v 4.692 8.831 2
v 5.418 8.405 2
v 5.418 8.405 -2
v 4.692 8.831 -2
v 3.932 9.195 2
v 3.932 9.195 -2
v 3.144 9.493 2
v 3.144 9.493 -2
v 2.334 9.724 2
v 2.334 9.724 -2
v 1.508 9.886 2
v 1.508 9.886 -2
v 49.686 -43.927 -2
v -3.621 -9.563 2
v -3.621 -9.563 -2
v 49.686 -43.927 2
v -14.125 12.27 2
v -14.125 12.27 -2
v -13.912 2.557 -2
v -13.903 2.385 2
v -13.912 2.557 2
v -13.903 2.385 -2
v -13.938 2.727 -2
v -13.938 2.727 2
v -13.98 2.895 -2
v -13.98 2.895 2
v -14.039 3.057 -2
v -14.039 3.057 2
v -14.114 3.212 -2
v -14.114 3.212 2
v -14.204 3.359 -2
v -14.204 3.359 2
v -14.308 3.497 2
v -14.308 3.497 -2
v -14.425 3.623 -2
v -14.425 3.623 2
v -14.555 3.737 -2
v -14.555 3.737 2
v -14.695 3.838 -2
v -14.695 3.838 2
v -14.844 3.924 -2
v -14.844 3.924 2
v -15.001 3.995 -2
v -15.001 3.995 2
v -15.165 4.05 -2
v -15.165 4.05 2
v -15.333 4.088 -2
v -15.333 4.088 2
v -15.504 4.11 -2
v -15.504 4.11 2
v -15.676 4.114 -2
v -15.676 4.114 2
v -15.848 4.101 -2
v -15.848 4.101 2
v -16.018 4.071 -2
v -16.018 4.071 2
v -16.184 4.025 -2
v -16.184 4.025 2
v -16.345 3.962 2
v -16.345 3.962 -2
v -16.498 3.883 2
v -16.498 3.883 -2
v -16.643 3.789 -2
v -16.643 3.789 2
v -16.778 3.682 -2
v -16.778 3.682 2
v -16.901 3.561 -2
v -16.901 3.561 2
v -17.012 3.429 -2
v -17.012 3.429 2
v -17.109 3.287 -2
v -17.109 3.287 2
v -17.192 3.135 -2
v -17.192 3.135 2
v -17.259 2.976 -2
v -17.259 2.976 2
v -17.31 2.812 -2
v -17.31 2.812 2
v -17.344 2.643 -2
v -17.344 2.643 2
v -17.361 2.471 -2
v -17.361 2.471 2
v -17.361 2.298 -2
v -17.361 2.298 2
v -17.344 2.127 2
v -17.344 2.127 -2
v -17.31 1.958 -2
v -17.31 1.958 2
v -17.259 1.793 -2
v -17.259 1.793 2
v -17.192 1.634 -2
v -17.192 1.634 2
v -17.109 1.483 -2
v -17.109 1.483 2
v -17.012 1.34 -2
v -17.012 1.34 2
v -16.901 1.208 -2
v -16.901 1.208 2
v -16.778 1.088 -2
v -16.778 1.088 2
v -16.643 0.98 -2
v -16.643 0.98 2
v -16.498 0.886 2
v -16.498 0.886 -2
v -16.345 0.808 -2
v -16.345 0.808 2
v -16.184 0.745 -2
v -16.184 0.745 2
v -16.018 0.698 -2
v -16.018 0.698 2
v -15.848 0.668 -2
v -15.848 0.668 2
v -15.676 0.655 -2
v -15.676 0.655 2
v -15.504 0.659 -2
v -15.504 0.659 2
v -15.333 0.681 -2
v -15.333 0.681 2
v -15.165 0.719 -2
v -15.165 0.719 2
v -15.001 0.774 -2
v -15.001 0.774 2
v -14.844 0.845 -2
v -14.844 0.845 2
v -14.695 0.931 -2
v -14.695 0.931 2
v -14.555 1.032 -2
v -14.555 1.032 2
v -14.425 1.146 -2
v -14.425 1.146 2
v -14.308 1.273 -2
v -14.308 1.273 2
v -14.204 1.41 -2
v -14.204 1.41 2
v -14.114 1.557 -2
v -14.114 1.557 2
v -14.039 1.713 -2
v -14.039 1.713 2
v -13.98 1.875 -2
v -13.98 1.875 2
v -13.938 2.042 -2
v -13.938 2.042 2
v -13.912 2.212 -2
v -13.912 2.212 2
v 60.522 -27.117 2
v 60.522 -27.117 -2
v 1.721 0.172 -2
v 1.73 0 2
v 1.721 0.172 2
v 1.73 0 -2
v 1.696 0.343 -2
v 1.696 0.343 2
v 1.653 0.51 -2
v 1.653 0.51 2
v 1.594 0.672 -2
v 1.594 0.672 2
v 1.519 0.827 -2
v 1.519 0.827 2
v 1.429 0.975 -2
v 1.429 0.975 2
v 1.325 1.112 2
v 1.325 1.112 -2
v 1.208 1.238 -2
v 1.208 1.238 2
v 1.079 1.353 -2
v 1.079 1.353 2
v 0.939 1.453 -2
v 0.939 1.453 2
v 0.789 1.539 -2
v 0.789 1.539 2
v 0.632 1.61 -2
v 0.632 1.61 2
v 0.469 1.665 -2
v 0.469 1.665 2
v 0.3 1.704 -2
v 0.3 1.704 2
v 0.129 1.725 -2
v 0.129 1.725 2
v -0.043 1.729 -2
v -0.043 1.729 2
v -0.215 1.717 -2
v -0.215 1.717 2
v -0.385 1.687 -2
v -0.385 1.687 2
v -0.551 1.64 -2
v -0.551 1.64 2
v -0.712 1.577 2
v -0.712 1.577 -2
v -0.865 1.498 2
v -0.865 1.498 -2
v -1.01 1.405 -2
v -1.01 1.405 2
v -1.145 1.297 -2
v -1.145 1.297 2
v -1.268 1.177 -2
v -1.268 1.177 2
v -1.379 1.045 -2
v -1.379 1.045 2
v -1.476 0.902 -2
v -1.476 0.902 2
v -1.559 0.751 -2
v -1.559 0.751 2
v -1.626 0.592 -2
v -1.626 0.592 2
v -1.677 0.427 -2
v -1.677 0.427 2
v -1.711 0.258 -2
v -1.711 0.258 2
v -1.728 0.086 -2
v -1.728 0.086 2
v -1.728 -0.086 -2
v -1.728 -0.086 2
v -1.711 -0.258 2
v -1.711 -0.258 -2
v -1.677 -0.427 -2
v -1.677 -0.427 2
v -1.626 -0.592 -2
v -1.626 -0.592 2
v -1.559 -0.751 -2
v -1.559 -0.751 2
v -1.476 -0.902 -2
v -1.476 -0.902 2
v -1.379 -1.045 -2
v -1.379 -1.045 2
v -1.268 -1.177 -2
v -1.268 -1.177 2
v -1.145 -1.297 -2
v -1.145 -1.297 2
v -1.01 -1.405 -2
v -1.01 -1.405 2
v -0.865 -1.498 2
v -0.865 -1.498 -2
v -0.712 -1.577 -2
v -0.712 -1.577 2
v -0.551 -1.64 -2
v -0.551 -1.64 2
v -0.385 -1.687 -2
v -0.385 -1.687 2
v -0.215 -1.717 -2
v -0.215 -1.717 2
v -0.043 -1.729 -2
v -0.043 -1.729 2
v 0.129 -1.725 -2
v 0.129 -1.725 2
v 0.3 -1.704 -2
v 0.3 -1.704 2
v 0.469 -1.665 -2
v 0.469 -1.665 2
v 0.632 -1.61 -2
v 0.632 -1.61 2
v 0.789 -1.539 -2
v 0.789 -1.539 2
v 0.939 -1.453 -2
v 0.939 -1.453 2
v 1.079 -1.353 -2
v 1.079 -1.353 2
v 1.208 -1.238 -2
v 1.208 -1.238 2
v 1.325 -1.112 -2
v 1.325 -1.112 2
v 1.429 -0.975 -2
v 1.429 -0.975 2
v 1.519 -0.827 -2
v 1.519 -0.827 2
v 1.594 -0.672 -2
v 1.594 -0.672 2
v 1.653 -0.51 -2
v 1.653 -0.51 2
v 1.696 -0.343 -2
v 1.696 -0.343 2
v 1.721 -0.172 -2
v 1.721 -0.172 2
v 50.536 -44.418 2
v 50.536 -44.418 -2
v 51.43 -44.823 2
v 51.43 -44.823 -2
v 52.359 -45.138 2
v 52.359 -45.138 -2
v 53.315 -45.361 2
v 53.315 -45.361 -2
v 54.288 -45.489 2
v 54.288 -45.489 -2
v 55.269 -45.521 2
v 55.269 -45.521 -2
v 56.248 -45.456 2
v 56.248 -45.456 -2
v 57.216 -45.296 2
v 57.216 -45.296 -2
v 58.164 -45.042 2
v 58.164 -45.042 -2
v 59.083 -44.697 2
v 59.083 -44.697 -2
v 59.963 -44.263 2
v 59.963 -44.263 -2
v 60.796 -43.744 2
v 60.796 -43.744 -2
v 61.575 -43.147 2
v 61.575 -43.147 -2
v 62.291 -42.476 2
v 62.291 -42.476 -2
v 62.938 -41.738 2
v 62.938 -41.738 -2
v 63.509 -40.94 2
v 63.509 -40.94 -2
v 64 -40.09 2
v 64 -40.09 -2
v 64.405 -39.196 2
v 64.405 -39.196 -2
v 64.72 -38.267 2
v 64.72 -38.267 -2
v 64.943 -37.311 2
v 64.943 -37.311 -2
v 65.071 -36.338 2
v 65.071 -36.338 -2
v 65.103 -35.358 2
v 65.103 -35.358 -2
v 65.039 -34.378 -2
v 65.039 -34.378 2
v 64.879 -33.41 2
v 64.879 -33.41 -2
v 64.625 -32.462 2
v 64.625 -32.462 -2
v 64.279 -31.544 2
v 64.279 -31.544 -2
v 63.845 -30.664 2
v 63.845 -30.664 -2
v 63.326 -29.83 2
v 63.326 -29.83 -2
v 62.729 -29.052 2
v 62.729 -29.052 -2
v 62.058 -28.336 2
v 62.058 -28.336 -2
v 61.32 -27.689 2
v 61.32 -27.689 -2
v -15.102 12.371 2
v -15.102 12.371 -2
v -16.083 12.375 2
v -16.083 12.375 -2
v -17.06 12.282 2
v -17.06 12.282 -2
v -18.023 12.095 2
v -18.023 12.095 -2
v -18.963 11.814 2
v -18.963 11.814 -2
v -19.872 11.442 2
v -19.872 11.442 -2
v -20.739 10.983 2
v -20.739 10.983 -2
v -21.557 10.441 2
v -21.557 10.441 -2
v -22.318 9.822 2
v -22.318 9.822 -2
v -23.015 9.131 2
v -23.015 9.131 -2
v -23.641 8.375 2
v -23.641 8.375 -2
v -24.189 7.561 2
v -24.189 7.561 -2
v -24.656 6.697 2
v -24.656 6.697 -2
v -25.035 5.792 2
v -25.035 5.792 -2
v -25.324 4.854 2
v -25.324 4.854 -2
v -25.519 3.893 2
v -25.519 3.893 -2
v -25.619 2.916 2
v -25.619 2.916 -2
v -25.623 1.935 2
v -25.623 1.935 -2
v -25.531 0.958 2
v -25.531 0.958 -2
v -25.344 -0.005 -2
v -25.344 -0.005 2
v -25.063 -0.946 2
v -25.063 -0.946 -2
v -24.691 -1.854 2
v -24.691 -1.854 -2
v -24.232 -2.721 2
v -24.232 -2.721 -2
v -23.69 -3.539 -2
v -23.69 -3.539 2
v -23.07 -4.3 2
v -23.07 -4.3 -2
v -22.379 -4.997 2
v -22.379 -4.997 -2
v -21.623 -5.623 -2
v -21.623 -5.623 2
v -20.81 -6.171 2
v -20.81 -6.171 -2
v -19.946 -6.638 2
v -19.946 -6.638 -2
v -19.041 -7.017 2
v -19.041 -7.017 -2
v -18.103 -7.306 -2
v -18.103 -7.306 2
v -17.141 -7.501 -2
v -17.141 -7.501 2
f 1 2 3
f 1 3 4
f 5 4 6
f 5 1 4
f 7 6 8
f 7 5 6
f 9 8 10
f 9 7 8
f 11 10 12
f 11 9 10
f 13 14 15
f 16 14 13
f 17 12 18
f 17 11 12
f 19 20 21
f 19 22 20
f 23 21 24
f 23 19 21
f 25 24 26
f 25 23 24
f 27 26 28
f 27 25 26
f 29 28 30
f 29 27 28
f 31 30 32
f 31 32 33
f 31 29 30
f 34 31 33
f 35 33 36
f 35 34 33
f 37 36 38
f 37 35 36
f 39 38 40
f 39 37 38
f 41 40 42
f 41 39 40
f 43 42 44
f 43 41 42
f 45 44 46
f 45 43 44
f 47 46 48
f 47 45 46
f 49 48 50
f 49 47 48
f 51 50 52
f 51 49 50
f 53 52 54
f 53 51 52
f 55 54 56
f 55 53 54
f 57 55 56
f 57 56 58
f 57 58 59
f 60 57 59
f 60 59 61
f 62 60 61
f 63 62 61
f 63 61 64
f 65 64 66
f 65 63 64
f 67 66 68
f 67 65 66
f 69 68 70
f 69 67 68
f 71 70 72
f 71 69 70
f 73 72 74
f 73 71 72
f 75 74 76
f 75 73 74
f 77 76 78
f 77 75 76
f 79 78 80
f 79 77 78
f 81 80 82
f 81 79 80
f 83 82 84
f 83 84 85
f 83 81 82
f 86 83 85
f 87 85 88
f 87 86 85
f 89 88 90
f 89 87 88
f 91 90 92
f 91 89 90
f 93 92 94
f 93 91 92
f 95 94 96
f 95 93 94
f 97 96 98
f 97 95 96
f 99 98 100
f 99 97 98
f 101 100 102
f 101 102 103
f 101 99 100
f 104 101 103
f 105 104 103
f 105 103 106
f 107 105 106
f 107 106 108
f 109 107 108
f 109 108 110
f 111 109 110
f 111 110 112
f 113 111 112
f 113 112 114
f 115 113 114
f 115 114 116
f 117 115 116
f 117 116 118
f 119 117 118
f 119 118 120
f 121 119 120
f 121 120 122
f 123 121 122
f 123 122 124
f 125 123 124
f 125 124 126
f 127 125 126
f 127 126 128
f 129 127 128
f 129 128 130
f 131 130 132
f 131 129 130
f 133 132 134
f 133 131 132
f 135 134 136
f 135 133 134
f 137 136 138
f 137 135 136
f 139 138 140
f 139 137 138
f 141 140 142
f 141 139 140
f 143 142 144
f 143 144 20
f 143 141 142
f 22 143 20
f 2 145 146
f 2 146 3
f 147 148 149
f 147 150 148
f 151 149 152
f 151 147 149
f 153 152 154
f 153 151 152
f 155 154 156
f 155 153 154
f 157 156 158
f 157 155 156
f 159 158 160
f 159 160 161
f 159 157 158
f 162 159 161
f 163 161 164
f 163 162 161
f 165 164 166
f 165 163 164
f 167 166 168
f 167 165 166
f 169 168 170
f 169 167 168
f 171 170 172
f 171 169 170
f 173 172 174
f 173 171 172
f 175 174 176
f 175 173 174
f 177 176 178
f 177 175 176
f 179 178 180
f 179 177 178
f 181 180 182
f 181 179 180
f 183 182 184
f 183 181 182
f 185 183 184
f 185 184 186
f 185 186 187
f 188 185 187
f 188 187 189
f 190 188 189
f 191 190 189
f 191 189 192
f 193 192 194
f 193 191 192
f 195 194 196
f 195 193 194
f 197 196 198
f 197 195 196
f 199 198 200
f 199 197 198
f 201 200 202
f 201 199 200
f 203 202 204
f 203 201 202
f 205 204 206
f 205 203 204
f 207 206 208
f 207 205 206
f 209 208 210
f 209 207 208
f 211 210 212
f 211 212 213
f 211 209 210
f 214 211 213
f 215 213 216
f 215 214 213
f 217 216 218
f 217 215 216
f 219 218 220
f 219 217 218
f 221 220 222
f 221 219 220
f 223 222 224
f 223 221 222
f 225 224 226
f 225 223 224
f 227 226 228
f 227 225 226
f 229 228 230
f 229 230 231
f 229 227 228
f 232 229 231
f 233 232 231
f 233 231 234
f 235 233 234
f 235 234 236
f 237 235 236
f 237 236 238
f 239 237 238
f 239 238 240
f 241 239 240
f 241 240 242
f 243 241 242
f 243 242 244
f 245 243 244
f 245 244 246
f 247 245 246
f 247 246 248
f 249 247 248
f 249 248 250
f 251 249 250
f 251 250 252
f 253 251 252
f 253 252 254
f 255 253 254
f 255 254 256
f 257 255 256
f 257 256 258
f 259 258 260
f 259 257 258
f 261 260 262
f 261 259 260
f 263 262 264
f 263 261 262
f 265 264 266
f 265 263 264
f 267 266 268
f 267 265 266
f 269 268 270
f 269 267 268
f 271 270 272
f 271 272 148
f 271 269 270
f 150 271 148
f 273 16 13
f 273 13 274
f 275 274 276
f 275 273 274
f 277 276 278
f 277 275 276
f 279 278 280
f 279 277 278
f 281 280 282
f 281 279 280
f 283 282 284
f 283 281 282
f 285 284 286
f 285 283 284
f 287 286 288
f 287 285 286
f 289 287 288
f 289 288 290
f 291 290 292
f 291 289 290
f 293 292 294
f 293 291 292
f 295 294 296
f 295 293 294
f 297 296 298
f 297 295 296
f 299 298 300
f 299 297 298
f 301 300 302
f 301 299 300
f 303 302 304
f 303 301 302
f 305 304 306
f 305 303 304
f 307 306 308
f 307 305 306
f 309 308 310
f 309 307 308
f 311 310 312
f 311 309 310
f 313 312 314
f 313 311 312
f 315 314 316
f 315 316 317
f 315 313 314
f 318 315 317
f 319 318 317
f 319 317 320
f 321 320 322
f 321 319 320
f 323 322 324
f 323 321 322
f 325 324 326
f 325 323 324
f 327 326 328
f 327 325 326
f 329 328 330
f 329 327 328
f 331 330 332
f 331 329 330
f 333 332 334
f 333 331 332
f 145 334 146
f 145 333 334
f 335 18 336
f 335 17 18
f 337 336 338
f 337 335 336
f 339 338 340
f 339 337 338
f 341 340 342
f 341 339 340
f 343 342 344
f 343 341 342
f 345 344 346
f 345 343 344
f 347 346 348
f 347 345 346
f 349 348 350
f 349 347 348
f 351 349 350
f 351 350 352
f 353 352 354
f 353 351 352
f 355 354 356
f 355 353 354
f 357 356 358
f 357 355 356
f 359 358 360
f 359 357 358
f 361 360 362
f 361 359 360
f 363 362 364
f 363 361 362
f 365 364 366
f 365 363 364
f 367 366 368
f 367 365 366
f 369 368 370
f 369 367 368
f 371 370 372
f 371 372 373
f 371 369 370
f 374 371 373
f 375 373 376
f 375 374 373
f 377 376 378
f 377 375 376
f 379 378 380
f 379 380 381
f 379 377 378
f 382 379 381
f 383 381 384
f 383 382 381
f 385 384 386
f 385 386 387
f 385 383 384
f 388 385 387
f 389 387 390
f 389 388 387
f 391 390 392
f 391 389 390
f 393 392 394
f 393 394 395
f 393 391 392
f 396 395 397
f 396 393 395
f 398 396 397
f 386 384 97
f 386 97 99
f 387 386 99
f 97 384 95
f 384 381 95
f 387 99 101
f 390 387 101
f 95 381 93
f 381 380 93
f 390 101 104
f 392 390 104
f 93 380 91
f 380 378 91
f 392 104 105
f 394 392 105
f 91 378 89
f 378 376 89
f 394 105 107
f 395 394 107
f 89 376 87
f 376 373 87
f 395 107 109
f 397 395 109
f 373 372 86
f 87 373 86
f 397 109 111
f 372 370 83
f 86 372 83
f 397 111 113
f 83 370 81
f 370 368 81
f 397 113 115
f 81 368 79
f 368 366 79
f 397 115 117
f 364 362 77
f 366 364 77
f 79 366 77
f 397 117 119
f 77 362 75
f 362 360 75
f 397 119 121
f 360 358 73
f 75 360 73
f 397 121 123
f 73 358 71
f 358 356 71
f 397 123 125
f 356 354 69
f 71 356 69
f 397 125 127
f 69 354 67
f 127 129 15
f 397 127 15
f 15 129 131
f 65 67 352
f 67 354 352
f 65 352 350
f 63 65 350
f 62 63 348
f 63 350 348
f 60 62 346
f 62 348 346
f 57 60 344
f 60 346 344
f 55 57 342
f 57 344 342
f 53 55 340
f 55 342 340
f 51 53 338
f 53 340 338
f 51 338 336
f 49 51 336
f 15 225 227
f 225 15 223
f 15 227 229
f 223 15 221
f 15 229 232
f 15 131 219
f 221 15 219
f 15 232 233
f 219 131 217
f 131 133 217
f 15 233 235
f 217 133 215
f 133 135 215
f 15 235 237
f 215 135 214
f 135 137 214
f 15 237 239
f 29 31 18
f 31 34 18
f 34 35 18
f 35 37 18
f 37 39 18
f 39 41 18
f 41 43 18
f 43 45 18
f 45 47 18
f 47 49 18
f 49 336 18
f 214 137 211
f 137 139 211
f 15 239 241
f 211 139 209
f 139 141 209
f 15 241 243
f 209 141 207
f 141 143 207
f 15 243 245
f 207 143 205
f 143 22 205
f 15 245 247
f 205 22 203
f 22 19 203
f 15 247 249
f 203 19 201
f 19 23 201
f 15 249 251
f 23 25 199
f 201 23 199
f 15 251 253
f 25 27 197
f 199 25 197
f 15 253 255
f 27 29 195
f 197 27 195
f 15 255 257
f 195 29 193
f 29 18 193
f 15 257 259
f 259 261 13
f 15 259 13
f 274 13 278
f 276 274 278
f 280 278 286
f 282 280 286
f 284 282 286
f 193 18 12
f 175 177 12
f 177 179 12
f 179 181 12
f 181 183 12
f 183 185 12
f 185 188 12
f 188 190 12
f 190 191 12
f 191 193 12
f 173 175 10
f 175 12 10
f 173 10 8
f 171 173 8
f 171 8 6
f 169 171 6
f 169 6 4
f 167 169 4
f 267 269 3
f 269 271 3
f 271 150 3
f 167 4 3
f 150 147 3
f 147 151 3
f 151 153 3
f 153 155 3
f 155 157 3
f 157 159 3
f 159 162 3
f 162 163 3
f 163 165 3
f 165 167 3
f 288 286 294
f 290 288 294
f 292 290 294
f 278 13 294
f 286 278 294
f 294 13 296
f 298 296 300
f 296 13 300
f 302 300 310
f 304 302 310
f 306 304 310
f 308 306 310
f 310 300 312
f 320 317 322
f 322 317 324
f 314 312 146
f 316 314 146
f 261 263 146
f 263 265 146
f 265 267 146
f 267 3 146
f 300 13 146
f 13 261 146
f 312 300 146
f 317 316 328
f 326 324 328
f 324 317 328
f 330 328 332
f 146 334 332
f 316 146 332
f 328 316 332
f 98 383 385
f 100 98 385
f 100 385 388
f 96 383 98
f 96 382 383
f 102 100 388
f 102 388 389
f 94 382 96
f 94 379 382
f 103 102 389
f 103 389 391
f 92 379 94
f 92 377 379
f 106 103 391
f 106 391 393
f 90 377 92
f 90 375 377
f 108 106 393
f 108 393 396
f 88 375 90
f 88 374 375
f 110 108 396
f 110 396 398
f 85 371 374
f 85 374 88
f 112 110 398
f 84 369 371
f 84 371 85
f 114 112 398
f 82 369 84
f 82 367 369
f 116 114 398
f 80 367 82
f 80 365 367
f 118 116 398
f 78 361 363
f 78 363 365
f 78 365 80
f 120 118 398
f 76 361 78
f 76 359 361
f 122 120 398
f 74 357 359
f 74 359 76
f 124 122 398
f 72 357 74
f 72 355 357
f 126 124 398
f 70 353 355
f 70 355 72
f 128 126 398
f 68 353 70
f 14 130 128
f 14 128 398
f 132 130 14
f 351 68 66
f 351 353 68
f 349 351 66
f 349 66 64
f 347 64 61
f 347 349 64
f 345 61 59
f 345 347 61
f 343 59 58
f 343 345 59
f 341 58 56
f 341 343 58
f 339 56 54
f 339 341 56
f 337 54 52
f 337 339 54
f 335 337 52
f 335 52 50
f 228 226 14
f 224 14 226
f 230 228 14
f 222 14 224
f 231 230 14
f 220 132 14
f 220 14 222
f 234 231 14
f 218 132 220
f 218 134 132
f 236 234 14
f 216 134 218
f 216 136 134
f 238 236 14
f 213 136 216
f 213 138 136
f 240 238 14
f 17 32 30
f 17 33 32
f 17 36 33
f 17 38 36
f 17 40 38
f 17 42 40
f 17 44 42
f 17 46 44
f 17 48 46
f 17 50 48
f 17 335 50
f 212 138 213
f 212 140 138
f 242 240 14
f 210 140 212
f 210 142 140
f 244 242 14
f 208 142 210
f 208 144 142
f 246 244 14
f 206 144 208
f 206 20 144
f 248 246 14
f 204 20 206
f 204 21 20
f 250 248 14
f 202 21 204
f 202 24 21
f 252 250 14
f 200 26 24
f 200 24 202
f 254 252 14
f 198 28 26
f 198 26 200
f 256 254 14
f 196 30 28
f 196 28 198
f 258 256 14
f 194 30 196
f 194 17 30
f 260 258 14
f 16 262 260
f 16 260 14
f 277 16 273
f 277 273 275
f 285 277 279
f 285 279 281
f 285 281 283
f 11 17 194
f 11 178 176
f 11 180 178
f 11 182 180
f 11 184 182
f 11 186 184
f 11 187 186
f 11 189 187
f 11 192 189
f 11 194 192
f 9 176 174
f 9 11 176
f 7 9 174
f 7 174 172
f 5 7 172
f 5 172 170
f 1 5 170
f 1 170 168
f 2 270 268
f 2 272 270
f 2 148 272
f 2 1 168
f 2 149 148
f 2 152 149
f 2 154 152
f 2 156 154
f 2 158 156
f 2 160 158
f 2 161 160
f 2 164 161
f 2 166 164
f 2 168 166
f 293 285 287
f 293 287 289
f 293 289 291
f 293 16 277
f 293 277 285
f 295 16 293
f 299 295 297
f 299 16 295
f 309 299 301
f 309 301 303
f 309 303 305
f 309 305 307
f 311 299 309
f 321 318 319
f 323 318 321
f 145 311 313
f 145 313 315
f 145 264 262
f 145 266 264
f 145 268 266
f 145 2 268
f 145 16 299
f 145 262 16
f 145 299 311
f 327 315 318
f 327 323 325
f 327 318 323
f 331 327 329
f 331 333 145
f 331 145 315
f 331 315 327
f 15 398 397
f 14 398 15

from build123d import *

# Parameters (mm, degrees)
SKETCH1_R           = 1.73
BOSS_EXTRUDE1_DEPTH = 2


with BuildPart() as part:
    # Sketch1 → Boss-Extrude1 (new body, symmetric)
    with BuildSketch(Plane.XY):
        with BuildLine():
            Line((-17.141234423, -7.500996555), (-3.621301313, -9.563286323))
            Line((-3.621301313, -9.563286323), (-5.418135156, -8.404987295))
            ThreePointArc((-5.418135156, -8.404987295), (-9.351968753, 3.541282315), (1.507927798, 9.885653937))
            Line((1.507927798, 9.885653937), (-14.125378827, 12.270311319))
            ThreePointArc((-14.125378827, 12.270311319), (-25.518960562, 3.89258518), (-17.141234423, -7.500996555))
        make_face()
        with Locations((-15.633306625, 2.384657382)):
            Circle(SKETCH1_R, mode=Mode.SUBTRACT)
        with BuildLine():
            Line((-3.621301313, -9.563286323), (-1.507927798, -9.885653937))
            ThreePointArc((-1.507927798, -9.885653937), (9.351968753, -3.541282315), (5.418135156, 8.404987295))
            ThreePointArc((5.418135156, 8.404987295), (3.541282315, 9.351968753), (1.507927798, 9.885653937))
            ThreePointArc((1.507927798, 9.885653937), (-9.351968753, 3.541282315), (-5.418135156, -8.404987295))
            Line((-5.418135156, -8.404987295), (-3.621301313, -9.563286323))
        make_face()
        Circle(SKETCH1_R, mode=Mode.SUBTRACT)
        with BuildLine():
            ThreePointArc((5.418135156, 8.404987295), (9.351968753, -3.541282315), (-1.507927798, -9.885653937))
            Line((-1.507927798, -9.885653937), (-3.621301313, -9.563286323))
            Line((-3.621301313, -9.563286323), (49.686174905, -43.927063542))
            ThreePointArc((49.686174905, -43.927063542), (63.509297356, -40.940211402), (60.522445216, -27.117088952))
            Line((60.522445216, -27.117088952), (5.418135156, 8.404987295))
        make_face()
    extrude(amount=BOSS_EXTRUDE1_DEPTH, both=True)


solid = part.part
